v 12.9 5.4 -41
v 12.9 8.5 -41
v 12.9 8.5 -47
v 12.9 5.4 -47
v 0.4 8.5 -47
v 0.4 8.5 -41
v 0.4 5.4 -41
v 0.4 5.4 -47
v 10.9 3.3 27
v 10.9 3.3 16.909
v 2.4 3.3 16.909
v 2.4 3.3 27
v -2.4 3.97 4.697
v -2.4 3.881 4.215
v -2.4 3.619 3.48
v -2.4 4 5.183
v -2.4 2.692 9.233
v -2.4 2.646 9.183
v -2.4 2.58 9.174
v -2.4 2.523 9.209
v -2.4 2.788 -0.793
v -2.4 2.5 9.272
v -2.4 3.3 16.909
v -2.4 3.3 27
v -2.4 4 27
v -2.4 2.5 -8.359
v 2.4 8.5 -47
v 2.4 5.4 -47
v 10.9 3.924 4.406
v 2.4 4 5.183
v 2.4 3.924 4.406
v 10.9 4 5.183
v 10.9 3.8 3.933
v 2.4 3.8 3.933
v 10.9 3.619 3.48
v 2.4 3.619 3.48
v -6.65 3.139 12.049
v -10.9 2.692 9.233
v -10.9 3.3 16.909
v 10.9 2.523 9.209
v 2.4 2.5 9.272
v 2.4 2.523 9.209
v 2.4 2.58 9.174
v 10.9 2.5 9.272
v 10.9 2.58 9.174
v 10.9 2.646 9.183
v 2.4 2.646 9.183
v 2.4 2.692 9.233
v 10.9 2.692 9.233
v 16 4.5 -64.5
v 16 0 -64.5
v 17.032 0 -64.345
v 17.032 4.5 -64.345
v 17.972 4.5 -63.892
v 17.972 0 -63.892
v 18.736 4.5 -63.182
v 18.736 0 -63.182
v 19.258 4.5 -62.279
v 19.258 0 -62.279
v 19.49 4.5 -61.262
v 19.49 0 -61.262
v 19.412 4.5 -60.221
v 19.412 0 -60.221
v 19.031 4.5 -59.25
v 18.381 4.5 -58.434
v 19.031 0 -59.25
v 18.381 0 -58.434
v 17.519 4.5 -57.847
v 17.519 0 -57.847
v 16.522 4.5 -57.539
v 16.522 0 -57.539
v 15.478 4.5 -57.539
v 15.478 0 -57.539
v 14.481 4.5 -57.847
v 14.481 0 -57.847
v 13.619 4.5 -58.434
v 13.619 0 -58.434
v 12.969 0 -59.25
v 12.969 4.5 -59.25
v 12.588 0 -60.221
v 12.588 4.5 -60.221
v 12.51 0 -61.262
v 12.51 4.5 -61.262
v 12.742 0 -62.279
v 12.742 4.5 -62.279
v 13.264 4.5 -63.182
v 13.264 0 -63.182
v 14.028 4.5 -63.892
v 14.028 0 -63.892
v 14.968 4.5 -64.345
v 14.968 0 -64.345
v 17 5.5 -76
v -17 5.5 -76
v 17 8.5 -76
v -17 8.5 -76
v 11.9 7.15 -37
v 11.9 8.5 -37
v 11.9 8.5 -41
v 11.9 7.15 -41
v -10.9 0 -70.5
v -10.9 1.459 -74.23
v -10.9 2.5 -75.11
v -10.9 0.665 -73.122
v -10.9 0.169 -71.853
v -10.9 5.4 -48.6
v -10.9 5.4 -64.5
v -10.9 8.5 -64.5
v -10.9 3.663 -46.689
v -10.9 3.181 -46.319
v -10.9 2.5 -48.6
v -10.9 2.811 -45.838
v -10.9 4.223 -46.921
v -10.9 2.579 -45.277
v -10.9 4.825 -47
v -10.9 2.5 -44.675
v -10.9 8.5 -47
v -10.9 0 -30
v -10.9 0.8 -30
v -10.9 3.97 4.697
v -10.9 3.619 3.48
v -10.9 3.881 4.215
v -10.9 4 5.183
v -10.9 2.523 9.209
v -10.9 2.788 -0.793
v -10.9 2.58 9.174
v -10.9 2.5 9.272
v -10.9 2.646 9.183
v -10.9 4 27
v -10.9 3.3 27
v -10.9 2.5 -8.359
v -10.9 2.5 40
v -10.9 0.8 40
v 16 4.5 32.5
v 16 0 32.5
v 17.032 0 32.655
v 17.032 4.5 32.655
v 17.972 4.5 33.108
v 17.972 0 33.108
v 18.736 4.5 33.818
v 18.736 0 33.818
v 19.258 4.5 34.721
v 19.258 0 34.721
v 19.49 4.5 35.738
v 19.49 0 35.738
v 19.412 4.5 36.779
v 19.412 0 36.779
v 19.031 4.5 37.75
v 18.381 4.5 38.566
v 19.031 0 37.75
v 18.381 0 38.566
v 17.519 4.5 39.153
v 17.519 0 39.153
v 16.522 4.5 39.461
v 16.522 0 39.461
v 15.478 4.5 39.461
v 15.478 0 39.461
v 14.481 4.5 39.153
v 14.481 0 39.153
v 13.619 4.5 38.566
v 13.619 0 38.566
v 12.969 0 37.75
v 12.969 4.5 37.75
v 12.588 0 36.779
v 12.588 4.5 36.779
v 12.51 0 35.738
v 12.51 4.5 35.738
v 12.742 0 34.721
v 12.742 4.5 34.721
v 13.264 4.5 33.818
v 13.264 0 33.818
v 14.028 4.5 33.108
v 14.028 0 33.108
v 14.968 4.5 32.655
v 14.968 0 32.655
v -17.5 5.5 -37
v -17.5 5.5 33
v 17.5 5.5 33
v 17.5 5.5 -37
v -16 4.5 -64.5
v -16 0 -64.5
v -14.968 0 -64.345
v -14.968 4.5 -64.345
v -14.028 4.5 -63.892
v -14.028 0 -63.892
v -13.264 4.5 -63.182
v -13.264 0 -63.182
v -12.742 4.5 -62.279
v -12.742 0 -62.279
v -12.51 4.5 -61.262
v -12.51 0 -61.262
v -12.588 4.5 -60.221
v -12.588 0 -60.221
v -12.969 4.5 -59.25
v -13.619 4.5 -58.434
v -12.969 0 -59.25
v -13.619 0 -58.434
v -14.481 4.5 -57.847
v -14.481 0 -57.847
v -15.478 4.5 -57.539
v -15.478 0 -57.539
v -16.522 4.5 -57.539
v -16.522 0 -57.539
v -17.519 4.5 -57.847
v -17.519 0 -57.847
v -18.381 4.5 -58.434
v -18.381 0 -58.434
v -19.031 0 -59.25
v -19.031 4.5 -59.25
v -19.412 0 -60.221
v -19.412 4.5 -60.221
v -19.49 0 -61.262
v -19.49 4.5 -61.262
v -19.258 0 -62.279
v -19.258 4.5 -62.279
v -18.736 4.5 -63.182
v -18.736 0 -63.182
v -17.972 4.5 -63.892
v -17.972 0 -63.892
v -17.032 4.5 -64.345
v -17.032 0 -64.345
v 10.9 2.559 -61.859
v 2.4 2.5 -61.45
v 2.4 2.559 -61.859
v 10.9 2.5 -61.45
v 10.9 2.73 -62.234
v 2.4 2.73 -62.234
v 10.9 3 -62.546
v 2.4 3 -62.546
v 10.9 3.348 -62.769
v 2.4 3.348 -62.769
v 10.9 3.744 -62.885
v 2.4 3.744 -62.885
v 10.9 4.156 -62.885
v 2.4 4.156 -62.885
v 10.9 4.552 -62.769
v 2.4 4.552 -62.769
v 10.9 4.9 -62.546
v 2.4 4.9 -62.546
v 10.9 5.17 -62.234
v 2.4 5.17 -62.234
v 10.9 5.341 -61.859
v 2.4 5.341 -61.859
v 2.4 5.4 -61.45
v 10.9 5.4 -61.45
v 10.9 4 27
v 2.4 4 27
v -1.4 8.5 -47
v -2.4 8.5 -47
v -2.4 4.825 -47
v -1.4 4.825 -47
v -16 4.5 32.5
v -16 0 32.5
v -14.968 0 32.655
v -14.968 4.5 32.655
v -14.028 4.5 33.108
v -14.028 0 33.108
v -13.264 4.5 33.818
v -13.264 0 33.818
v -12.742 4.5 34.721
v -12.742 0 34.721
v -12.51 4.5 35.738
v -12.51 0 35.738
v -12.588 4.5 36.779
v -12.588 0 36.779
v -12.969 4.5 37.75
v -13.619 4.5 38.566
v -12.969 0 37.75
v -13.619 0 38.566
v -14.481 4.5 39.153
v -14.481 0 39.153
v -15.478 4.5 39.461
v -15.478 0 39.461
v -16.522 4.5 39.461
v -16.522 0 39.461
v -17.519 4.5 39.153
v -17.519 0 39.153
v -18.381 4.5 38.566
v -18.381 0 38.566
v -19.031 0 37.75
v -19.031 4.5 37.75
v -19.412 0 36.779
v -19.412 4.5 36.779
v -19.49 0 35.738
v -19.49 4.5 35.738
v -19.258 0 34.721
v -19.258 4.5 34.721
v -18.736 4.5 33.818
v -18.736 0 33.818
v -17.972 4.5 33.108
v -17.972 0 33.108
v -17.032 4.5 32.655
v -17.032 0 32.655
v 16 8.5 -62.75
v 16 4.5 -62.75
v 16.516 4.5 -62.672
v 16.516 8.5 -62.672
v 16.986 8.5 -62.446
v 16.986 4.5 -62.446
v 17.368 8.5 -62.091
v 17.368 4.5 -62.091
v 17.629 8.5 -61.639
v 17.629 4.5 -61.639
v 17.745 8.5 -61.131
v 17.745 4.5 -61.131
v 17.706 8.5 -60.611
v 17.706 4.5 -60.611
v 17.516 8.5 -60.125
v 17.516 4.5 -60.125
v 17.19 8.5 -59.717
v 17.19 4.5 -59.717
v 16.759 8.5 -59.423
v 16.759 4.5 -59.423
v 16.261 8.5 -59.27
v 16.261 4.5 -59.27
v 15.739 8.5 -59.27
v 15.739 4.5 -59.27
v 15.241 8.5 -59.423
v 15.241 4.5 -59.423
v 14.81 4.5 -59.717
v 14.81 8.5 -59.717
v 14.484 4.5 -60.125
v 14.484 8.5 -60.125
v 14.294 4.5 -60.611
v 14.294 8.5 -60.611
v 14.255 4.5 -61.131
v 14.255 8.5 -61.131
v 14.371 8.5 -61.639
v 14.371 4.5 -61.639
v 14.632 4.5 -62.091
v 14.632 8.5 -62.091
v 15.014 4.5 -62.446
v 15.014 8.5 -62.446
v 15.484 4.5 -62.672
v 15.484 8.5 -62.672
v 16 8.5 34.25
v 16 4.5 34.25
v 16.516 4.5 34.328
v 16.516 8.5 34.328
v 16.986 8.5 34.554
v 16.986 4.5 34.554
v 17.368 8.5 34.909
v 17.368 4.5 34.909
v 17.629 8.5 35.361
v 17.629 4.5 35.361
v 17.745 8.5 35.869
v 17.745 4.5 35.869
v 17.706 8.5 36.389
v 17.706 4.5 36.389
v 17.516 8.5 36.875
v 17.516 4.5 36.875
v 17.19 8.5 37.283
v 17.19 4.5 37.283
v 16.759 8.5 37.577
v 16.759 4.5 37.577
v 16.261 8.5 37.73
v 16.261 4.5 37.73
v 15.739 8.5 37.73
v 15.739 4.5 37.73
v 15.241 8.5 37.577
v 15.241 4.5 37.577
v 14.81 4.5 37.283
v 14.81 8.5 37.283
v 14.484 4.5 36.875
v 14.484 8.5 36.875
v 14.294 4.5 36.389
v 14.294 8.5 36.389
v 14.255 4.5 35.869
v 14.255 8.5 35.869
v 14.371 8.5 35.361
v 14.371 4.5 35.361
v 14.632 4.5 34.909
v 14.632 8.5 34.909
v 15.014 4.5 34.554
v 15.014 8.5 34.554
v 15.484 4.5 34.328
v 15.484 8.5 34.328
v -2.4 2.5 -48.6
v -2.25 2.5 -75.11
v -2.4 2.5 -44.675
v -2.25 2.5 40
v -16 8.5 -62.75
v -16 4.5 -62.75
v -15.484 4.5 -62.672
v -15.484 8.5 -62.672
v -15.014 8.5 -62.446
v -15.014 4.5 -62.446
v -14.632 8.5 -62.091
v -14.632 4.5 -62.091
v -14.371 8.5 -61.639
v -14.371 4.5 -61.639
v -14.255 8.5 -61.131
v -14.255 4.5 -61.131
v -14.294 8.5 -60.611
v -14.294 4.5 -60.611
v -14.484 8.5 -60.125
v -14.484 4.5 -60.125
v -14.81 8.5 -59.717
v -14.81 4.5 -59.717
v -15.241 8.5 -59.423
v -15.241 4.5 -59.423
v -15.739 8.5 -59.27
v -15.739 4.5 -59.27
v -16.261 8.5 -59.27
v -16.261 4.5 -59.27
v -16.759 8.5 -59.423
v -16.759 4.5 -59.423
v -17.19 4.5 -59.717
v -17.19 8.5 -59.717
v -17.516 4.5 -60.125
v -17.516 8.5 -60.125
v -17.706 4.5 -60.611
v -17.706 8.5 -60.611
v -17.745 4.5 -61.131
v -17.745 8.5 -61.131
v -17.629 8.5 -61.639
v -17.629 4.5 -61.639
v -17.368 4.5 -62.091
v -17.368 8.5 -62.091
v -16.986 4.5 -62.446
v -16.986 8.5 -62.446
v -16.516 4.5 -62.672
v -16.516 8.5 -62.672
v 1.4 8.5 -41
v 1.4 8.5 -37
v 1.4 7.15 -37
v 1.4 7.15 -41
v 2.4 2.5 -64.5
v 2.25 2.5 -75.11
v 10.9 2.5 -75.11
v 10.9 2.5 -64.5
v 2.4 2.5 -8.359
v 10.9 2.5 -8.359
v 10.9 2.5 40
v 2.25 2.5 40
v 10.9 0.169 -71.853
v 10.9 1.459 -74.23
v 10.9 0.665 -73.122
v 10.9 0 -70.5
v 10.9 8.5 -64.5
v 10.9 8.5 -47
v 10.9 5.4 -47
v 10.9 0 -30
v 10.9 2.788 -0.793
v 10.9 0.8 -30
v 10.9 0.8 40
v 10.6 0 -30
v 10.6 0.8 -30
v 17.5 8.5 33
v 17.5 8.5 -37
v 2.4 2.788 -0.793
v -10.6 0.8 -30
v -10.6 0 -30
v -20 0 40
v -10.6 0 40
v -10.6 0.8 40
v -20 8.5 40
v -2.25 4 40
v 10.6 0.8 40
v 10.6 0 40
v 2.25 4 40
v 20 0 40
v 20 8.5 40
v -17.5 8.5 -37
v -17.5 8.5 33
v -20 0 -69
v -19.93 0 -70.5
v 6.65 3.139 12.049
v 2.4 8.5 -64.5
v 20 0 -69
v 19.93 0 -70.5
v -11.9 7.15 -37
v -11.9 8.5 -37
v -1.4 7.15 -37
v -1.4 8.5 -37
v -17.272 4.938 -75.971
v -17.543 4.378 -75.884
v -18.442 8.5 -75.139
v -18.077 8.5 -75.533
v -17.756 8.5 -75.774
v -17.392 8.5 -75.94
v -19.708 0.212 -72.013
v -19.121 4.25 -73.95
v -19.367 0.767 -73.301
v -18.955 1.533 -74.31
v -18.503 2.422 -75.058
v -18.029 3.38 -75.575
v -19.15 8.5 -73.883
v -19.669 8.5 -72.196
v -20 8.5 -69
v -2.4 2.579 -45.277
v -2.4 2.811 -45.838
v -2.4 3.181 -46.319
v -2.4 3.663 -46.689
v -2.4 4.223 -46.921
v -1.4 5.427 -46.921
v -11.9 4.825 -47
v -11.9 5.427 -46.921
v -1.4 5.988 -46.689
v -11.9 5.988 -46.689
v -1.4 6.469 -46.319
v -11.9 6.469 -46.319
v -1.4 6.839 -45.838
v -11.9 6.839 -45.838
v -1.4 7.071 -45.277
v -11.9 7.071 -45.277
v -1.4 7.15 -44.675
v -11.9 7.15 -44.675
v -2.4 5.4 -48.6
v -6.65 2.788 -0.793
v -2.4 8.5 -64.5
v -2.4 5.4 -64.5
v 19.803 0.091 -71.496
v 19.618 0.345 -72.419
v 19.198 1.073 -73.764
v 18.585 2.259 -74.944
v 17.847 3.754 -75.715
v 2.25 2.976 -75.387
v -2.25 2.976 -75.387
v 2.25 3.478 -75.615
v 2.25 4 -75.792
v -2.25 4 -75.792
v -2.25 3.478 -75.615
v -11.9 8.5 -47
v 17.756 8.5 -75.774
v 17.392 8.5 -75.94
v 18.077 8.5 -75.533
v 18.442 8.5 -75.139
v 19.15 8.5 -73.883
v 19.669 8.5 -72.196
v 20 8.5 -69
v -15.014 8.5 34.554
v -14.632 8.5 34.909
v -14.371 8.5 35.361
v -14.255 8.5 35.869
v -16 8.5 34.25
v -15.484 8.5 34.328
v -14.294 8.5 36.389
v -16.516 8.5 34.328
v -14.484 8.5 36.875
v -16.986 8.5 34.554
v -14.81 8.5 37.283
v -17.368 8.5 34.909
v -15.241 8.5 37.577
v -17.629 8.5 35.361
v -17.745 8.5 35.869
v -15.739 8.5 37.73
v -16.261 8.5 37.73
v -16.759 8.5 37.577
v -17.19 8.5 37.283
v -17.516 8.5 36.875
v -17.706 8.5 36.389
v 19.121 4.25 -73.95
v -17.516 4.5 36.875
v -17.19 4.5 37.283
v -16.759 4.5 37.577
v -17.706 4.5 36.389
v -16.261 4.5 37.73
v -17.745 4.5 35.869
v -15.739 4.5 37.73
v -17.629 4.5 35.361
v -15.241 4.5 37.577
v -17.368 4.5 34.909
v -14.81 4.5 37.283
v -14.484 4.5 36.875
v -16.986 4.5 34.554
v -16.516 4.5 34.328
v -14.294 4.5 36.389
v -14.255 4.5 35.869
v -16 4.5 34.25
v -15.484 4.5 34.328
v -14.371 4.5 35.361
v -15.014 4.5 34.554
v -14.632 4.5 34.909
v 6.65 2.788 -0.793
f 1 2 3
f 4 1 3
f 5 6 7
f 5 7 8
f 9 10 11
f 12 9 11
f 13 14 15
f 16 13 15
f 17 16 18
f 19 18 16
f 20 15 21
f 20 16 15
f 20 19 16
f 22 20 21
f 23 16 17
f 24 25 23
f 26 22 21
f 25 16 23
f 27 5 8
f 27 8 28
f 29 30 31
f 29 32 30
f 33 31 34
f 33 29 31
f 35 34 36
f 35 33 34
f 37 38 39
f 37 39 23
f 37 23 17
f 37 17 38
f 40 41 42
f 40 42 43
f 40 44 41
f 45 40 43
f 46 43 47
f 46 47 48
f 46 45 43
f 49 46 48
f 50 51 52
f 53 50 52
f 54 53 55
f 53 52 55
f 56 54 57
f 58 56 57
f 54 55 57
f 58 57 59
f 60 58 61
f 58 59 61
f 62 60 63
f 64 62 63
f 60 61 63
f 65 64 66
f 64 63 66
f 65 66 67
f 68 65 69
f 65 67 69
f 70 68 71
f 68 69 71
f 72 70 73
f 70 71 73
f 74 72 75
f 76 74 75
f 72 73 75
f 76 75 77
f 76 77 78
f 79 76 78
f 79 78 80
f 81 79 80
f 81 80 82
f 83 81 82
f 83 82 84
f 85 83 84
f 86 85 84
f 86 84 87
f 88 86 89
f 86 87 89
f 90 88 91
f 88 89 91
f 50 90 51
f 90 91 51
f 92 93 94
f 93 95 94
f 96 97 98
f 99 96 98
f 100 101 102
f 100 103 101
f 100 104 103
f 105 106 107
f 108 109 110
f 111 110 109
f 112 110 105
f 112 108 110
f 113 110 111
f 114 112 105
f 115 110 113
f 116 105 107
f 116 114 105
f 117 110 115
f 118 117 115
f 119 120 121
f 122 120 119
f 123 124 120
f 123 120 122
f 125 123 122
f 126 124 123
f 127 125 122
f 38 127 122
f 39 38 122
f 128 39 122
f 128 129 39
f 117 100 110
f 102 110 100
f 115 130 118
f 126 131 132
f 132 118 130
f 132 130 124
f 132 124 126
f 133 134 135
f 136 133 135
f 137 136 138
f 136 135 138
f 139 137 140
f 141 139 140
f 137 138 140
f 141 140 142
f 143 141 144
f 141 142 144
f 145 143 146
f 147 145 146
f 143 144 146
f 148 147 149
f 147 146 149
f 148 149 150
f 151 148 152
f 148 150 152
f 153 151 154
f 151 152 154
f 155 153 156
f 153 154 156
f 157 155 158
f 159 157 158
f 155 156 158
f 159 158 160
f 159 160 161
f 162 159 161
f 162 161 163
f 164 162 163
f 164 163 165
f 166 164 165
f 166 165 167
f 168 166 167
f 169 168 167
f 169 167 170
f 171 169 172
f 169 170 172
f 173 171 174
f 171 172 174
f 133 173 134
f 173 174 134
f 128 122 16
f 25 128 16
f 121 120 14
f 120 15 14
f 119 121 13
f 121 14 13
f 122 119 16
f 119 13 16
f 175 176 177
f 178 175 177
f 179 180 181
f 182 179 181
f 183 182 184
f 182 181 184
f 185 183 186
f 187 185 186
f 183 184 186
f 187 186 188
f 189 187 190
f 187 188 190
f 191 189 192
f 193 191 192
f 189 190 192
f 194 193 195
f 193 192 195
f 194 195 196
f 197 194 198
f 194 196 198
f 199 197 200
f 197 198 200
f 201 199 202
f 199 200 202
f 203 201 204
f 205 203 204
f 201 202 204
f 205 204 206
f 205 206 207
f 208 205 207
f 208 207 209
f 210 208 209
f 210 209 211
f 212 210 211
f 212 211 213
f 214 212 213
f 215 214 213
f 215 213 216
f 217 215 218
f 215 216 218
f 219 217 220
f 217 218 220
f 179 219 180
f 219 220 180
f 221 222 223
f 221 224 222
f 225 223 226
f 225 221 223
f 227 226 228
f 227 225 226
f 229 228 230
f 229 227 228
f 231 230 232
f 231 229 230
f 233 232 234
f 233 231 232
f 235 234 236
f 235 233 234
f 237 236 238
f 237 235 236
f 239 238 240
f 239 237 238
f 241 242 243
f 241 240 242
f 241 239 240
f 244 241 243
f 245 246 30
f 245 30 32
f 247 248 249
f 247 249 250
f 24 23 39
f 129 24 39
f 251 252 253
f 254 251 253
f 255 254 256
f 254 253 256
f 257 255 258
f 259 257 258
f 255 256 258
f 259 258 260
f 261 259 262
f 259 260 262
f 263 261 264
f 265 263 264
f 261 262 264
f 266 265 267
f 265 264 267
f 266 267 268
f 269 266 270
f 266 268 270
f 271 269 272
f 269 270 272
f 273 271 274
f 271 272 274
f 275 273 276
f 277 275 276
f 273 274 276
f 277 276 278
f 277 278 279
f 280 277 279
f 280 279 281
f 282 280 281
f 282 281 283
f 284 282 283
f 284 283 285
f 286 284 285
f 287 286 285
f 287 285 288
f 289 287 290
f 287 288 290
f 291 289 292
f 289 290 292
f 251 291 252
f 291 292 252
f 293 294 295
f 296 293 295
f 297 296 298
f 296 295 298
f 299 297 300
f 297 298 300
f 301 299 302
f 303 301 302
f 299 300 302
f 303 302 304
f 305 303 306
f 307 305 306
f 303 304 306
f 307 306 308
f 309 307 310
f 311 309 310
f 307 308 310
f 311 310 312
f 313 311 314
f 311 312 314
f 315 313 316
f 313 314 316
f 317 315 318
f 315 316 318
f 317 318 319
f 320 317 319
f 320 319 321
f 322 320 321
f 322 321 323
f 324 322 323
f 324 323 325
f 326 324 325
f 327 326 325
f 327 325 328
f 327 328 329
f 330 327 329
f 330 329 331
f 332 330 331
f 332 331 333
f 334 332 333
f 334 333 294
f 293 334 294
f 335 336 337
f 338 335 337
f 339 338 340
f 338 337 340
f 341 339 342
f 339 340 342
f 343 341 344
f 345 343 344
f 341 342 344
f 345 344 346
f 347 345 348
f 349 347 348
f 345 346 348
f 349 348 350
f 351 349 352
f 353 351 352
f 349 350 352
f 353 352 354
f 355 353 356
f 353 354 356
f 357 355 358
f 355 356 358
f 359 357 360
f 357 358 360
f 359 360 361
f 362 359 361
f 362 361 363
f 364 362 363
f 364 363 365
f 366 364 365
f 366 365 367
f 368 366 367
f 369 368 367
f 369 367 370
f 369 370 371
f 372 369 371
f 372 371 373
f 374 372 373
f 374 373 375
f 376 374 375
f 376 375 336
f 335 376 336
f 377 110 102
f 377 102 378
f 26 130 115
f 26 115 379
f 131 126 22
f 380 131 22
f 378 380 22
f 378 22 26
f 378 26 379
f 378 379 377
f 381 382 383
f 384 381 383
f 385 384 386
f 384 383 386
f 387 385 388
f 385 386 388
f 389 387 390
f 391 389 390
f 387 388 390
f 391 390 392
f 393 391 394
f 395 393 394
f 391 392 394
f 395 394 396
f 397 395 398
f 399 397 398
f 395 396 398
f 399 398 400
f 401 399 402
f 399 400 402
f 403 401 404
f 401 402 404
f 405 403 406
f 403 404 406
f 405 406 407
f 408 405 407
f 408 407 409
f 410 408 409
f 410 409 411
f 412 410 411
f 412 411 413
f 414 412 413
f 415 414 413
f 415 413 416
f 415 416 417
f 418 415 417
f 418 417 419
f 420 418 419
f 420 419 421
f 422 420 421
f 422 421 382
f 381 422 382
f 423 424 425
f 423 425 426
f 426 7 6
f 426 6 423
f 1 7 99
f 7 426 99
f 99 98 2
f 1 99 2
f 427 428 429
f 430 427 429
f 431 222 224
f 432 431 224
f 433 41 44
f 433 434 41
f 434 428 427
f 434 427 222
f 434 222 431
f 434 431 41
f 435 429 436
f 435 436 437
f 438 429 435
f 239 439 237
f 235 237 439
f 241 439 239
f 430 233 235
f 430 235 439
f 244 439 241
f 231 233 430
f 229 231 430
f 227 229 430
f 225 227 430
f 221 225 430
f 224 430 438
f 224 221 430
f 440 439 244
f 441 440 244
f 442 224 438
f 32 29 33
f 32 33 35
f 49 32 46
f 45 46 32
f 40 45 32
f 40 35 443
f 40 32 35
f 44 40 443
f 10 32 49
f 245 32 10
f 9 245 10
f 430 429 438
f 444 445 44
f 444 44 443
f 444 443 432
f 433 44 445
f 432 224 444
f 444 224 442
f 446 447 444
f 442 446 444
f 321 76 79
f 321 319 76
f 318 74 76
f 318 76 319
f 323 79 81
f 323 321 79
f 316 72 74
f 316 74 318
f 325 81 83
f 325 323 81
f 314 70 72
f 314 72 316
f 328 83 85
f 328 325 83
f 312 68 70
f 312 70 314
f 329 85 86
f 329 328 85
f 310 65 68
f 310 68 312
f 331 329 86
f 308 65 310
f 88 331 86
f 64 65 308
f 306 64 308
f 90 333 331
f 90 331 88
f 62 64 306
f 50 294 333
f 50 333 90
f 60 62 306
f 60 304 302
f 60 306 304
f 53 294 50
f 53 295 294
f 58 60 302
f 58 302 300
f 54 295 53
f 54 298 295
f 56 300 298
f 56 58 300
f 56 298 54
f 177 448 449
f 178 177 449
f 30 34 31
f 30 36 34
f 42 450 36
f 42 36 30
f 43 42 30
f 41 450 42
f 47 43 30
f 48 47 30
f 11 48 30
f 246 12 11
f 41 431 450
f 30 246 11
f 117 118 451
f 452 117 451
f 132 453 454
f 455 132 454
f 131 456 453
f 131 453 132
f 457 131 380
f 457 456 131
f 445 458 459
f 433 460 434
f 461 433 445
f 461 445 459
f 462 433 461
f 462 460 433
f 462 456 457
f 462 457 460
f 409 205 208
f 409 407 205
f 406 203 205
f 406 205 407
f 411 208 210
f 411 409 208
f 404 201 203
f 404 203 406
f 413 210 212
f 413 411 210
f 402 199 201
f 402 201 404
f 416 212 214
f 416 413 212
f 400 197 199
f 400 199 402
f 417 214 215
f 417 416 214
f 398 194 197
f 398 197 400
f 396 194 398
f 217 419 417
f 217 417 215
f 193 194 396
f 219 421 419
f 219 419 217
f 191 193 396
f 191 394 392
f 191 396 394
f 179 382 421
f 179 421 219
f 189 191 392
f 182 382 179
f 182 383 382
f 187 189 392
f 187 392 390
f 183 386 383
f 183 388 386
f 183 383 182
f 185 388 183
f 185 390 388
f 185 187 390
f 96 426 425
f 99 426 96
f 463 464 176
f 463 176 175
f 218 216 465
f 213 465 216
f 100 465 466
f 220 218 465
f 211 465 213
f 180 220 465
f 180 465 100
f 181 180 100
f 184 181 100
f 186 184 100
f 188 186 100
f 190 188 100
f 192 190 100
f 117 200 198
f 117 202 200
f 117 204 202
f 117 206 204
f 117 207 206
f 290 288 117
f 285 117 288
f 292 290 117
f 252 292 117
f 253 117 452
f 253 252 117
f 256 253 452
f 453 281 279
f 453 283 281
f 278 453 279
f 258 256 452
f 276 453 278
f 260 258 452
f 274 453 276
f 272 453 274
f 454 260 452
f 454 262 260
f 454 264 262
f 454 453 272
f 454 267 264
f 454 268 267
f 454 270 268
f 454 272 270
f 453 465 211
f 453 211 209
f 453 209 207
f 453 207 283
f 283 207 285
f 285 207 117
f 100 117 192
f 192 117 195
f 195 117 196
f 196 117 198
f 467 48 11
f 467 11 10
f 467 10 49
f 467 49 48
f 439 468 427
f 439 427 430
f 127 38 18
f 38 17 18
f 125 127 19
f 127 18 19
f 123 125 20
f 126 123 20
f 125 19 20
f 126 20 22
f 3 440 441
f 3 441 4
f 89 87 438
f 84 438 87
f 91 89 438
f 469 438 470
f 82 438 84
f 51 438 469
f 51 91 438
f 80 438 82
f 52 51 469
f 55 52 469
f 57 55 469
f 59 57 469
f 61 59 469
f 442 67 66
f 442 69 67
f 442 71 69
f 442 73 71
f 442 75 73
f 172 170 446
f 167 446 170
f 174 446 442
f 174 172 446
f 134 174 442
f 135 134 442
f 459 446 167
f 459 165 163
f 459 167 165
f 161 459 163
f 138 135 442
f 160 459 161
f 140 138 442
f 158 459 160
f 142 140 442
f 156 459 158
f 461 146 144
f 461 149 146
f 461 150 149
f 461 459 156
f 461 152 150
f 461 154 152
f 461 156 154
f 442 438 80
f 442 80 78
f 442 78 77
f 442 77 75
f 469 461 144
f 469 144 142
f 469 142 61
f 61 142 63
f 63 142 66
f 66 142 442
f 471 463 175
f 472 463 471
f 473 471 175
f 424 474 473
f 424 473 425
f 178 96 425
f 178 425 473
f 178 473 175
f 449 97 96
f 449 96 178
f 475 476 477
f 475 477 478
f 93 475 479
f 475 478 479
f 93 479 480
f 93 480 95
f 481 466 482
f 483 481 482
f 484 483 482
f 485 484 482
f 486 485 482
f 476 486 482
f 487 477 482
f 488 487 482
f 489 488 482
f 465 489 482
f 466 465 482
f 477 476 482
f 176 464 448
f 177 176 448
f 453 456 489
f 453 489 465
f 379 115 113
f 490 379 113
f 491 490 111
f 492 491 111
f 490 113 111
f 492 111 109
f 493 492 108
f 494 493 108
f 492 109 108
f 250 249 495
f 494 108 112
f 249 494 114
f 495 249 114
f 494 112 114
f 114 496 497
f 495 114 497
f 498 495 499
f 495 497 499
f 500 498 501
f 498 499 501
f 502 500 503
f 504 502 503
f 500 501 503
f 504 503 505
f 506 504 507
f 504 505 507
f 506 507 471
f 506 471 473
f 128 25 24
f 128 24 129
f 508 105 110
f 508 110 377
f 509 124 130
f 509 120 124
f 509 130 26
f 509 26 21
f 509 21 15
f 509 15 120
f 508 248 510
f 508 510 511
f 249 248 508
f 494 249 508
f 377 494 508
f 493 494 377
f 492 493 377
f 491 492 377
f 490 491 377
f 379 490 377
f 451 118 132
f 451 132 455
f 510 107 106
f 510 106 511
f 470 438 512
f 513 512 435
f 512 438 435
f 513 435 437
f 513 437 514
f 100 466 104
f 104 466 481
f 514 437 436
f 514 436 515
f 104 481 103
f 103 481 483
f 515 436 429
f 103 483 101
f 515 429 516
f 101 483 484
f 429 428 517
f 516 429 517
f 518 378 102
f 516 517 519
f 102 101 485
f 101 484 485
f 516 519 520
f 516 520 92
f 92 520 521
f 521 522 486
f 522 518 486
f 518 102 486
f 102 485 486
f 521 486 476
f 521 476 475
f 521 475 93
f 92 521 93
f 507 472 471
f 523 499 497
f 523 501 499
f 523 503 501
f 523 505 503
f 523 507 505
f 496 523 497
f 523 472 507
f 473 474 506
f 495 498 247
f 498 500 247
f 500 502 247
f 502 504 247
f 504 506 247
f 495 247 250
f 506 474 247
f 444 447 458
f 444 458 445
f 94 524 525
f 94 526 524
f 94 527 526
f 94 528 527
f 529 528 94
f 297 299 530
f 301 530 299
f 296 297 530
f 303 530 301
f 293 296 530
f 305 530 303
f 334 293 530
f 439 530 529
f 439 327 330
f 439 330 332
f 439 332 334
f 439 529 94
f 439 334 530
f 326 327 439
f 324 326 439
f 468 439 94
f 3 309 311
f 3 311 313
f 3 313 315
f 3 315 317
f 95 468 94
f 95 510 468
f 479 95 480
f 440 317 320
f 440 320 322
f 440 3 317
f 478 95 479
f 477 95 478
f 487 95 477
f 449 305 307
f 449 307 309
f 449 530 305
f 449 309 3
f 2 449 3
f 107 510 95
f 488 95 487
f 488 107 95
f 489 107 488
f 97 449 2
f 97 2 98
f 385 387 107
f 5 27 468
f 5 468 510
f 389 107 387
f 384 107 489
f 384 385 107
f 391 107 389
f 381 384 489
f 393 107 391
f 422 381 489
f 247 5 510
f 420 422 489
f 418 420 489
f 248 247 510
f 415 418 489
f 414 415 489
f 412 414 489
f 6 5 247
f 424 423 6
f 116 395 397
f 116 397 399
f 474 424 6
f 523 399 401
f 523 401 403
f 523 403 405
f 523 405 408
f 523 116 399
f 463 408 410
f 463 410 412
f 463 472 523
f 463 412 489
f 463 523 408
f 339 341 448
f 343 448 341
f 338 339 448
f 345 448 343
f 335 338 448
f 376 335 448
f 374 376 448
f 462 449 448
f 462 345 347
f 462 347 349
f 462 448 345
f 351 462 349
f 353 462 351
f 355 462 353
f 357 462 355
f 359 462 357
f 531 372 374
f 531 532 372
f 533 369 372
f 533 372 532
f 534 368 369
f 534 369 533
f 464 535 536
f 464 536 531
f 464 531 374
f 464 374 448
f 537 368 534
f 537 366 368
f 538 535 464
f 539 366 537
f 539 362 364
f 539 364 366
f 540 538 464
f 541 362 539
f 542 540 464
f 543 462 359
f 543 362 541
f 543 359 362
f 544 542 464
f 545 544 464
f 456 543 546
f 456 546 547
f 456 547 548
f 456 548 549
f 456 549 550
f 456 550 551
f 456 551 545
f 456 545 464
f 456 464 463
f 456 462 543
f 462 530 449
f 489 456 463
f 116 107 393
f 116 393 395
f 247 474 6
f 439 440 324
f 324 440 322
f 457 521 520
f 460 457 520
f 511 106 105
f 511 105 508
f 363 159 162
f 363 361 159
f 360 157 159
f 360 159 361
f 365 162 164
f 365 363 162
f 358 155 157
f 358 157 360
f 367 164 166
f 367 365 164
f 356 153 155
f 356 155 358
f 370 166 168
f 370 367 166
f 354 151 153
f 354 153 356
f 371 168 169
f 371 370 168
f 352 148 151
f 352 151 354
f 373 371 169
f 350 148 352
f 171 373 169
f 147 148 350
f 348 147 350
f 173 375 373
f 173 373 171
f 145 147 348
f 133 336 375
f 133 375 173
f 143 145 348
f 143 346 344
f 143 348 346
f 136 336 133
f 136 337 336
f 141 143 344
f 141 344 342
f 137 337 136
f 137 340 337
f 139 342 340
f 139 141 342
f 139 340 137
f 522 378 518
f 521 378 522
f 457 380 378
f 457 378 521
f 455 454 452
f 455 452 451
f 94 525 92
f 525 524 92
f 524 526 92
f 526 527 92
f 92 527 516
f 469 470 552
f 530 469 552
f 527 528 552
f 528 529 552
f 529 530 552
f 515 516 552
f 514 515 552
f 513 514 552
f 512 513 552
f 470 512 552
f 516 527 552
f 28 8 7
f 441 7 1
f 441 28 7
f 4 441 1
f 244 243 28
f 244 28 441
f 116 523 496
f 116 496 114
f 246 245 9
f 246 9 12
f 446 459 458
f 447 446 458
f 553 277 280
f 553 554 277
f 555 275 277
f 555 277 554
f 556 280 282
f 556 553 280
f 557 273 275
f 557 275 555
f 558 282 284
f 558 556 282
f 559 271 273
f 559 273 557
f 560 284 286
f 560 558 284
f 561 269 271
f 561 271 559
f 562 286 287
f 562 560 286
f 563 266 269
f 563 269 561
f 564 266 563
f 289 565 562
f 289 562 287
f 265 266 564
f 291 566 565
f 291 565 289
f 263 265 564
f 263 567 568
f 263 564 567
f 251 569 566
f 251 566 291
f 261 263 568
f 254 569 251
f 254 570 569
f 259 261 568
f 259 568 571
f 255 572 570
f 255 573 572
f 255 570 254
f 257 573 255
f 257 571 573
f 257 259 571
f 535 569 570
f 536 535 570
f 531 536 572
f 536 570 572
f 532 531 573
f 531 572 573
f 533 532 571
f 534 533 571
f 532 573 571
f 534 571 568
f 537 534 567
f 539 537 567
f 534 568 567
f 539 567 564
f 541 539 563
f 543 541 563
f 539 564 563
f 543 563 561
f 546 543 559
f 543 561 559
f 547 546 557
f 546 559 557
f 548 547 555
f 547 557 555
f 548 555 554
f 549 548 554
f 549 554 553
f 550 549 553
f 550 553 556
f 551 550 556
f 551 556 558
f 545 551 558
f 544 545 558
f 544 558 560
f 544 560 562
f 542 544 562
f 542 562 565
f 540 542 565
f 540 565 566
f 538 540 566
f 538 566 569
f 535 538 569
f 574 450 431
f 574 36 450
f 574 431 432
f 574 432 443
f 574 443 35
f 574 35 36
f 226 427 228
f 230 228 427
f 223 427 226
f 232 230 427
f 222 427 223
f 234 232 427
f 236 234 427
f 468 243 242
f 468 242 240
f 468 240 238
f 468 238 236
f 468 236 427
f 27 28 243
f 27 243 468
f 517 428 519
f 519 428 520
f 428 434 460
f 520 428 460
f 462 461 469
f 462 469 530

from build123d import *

# Parameters (mm, degrees)
SKETCH1_W                  = 40
SKETCH1_H                  = 106
BOSS_EXTRUDE1_DEPTH        = 8.5
SKETCH2_W                  = 35
SKETCH2_H                  = 70
CUT_EXTRUDE1_DEPTH         = 3
SKETCH3_W                  = 10.5
SKETCH3_H                  = 10
CUT_EXTRUDE2_DEPTH         = 1.35
SKETCH4_W                  = 12.5
SKETCH4_H                  = 6
CUT_EXTRUDE3_DEPTH         = 3.1
SKETCH5_W                  = 8.5
SKETCH5_H                  = 17.5
PCB_PLACE_DEPTH            = 3.1
SKETCH6_W                  = 8.5
SKETCH6_H                  = 1.6
NICKEL_STRIP_HOLE_DEPTH    = 70.174850921
CUT_EXTRUDE4_REACH         = 71.486
SKETCH7_W                  = 8.5
SKETCH7_H                  = 17.5
SKETCH8_W                  = 8.5
SKETCH8_H                  = 1.6
CUT_EXTRUDE5_DEPTH         = 10
SKETCH9_W                  = 8.5
SKETCH9_H                  = 106
NICKEL_STRIP_RAIL_DEPTH    = 2.5
FILLET3_R                  = 2.325
FILLET4_RADIUS             = 1.45
FILLET4_LENGTH             = 8.5
SKETCH10_W                 = 8.5
SKETCH10_H                 = 5
CUT_EXTRUDE6_DEPTH         = 1.5
SKETCH11_W                 = 8.5
SKETCH11_H                 = 0.7
NICKELSTRIPINSERTION_DEPTH = 18
FILLET5_INSERTION_START    = -10.9
FILLET5_INSERTION_DEPTH    = 8.5
FILLET5_INSERTION_START_2  = 2.4
FILLET5_INSERTION_2_DEPTH  = 8.5
FILLET7_AMEND_R            = 4
FILLET6_START              = -10.9
FILLET6_DEPTH              = 8.5
FILLET6_START_2            = 2.4
FILLET6_2_DEPTH            = 8.5
FILLET8_ROUNDING_R         = 0.1
SKETCH12_W                 = 0.3
SKETCH12_H                 = 0.8
STRIPRAIL_DEPTH            = 70
SKETCH13_R                 = 1.75
SCREW_HOLES_DEPTH          = 70.485610128
SKETCH14_R                 = 3.5
SCREW_HEAD_HOLES_TBM_DEPTH = 4.5
BOSS_EXTRUDE2_DEPTH        = 10
FILLET12_SIZE              = 7
FILLET12_SIZE_2            = 3
FILLET11_R                 = 5.5
SKETCH17_W                 = 4.5
SKETCH17_H                 = 4
CUT_EXTRUDE9_DEPTH         = 116
SKETCH18_W                 = 5.4
SKETCH18_H                 = 2.5
CUT_EXTRUDE10_DEPTH        = 116


with BuildPart() as part:
    # Sketch1 → Boss-Extrude1 (new body)
    with BuildSketch(Plane(origin=(0, 0, 0), x_dir=(1, 0, 0), z_dir=(0, 1, 0))):
        with Locations((0, 13)):
            Rectangle(SKETCH1_W, SKETCH1_H)
    extrude(amount=BOSS_EXTRUDE1_DEPTH)

    # Sketch2 → Cut-Extrude1 (cut)
    with BuildSketch(Plane(origin=(0, 8.5, 0), x_dir=(1, 0, 0), z_dir=(0, 1, 0))):
        with Locations((0, 2)):
            Rectangle(SKETCH2_W, SKETCH2_H)
    extrude(amount=-CUT_EXTRUDE1_DEPTH, mode=Mode.SUBTRACT)

    # Sketch3 → Cut-Extrude2 (cut)
    with BuildSketch(Plane(origin=(0, 8.5, 0), x_dir=(1, 0, 0), z_dir=(0, 1, 0))):
        with Locations((-6.65, 42)):
            Rectangle(SKETCH3_W, SKETCH3_H)
        with Locations((6.65, 42)):
            Rectangle(SKETCH3_W, SKETCH3_H)
    extrude(amount=-CUT_EXTRUDE2_DEPTH, mode=Mode.SUBTRACT)

    # Sketch4 → Cut-Extrude3 (cut)
    with BuildSketch(Plane(origin=(0, 8.5, 0), x_dir=(1, 0, 0), z_dir=(0, 1, 0))):
        with Locations((6.65, 44)):
            Rectangle(SKETCH4_W, SKETCH4_H)
    extrude(amount=-CUT_EXTRUDE3_DEPTH, mode=Mode.SUBTRACT)

    # Sketch5 → PCB place (cut)
    with BuildSketch(Plane(origin=(0, 8.5, 0), x_dir=(1, 0, 0), z_dir=(0, 1, 0))):
        with Locations((6.65, 55.75)):
            Rectangle(SKETCH5_W, SKETCH5_H)
    extrude(amount=-PCB_PLACE_DEPTH, mode=Mode.SUBTRACT)

    # Sketch6 → Nickel strip hole (cut, through all)
    with BuildSketch(Plane(origin=(0, 5.4, 0), x_dir=(1, 0, 0), z_dir=(0, 1, 0))):
        with Locations((6.65, 63.7)):
            Rectangle(SKETCH6_W, SKETCH6_H)
    extrude(amount=-NICKEL_STRIP_HOLE_DEPTH, mode=Mode.SUBTRACT)

    # Cut-Extrude4: up to this face of the body (flat: up to its plane)
    cut_extrude4_end = Plane(part.part.faces().sort_by_distance((6.65, 5.4, -51.042077088))[0])
    # Sketch7 → Cut-Extrude4 (cut, up to the picked face)
    with BuildSketch(Plane(origin=(0, 8.5, 0), x_dir=(1, 0, 0), z_dir=(0, 1, 0)), mode=Mode.PRIVATE) as cut_extrude4_sk1:
        with Locations((-6.65, 55.75)):
            Rectangle(SKETCH7_W, SKETCH7_H)
    cut_extrude4_tool1 = split(extrude(cut_extrude4_sk1.sketch, amount=-CUT_EXTRUDE4_REACH, mode=Mode.PRIVATE), bisect_by=cut_extrude4_end, keep=Keep.BOTH, mode=Mode.PRIVATE)
    add(cut_extrude4_tool1.solids().sort_by(Axis((-6.65, 8.5, -55.75), (0, -1, 0)))[0], mode=Mode.SUBTRACT)

    # Sketch8 → Cut-Extrude5 (cut)
    with BuildSketch(Plane(origin=(0, 5.4, 0), x_dir=(1, 0, 0), z_dir=(0, 1, 0))):
        with Locations((-6.65, 47.8)):
            Rectangle(SKETCH8_W, SKETCH8_H)
    extrude(amount=-CUT_EXTRUDE5_DEPTH, mode=Mode.SUBTRACT)

    # Sketch9 → Nickel strip rail (cut)
    with BuildSketch(Plane.XZ):
        with Locations((-6.65, -13)):
            Rectangle(SKETCH9_W, SKETCH9_H)
        with Locations((6.65, -13)):
            Rectangle(SKETCH9_W, SKETCH9_H)
    extrude(amount=-NICKEL_STRIP_RAIL_DEPTH, mode=Mode.SUBTRACT)

    # Fillet3
    # the kernel refuses this fillet: 2.325 mm, written as the material it takes off along each edge
    with BuildSketch(Plane(origin=(3.4125, 7.15, -47), x_dir=(0, 0, 1), z_dir=(-1, 0, 0))) as fillet3_piece_1_section:
        with BuildLine():
            CenterArc((FILLET3_R, -FILLET3_R), FILLET3_R, 90, 90)
            Line((0, -FILLET3_R), (0, 0))
            Line((0, 0), (FILLET3_R, 0))
        make_face()
    fillet3_piece_1 = extrude(amount=20.125, mode=Mode.PRIVATE)
    fillet3_piece_1 = split(fillet3_piece_1, bisect_by=Plane(origin=(-11.9, 7.15, -47), z_dir=(1, 0, 0)), keep=Keep.TOP, mode=Mode.PRIVATE)
    fillet3_piece_1 = split(fillet3_piece_1, bisect_by=Plane(origin=(-1.4, 7.15, -47), z_dir=(-1, 0, 0)), keep=Keep.TOP, mode=Mode.PRIVATE)
    add(fillet3_piece_1, mode=Mode.SUBTRACT)
    with BuildSketch(Plane(origin=(-10.9, 2.5, -47), x_dir=(0, 1, 0), z_dir=(1, 0, 0))) as fillet3_piece_2:
        with BuildLine():
            CenterArc((FILLET3_R, FILLET3_R), FILLET3_R, 180, 90)
            Line((0, FILLET3_R), (0, 0))
            Line((0, 0), (FILLET3_R, 0))
        make_face()
    extrude(amount=8.5, mode=Mode.SUBTRACT)

    # Fillet4: full round fillet: the end face becomes a half cylinder, R = half its width
    fillet4_face = Plane((6.65, 3.95, -62.9), x_dir=(1, 0, 0), z_dir=(0, 0, -1))  # on the end face: x along it, z out of the body
    fillet4_slab = fillet4_face.offset(-FILLET4_RADIUS / 2) * Box(FILLET4_LENGTH, 2 * FILLET4_RADIUS, FILLET4_RADIUS, mode=Mode.PRIVATE)  # the body's end, R deep
    fillet4_round = Plane((6.65, 3.95, -61.45), x_dir=(0, 0, -1), z_dir=(1, 0, 0)) * Cylinder(FILLET4_RADIUS, FILLET4_LENGTH, mode=Mode.PRIVATE)  # its axis R under the face
    add(fillet4_slab - fillet4_round, mode=Mode.SUBTRACT)

    # Sketch10 → Cut-Extrude6 (cut)
    with BuildSketch(Plane.XZ.offset(-2.5)):
        with Locations((6.65, 6.5)):
            Rectangle(SKETCH10_W, SKETCH10_H)
        with Locations((-6.65, 6.5)):
            Rectangle(SKETCH10_W, SKETCH10_H)
    extrude(amount=-CUT_EXTRUDE6_DEPTH, mode=Mode.SUBTRACT)

    # Sketch11 → NickelStripInsertion (cut)
    with BuildSketch(Plane(origin=(0, 0, 9), x_dir=(-1, 0, 0), z_dir=(0, 0, -1))):
        with Locations((-6.65, 3.65)):
            Rectangle(SKETCH11_W, SKETCH11_H)
        with Locations((6.65, 3.65)):
            Rectangle(SKETCH11_W, SKETCH11_H)
    extrude(amount=-NICKELSTRIPINSERTION_DEPTH, mode=Mode.SUBTRACT)

    # Fillet5_insertion: read off the stored shape, not the designer's step
    # Fillet5_insertion outline → Fillet5_insertion (cut)
    with BuildSketch(Plane.YZ.offset(FILLET5_INSERTION_START)):
        with BuildLine():
            Line((2.5, 4), (2.5, -8.359207094))
            add(Edge.make_bspline(
                [(2.5, -8.359207094), (2.5, 2.968380423), (4, 4)],
                knots=[0, 0, 0, 1, 1, 1], degree=2, weights=[1, 0.885061203, 1]))
            Line((4, 4), (2.5, 4))
        make_face()
    extrude(amount=FILLET5_INSERTION_DEPTH, mode=Mode.SUBTRACT)

    # Fillet5_insertion 2 outline → Fillet5_insertion 2 (cut)
    with BuildSketch(Plane.YZ.offset(FILLET5_INSERTION_START_2)):
        with BuildLine():
            Line((2.5, 4), (2.5, -8.359207094))
            add(Edge.make_bspline(
                [(2.5, -8.359207094), (2.5, 2.968380423), (4, 4)],
                knots=[0, 0, 0, 1, 1, 1], degree=2, weights=[1, 0.885061203, 1]))
            Line((4, 4), (2.5, 4))
        make_face()
    extrude(amount=FILLET5_INSERTION_2_DEPTH, mode=Mode.SUBTRACT)

    # Fillet7_amend
    fillet7_amend_edges = [part.edges().sort_by_distance(p)[0] for p in [
        (6.65, 4, 4),
        (-6.65, 4, 4),
    ]]
    fillet(fillet7_amend_edges, radius=FILLET7_AMEND_R)

    # Fillet6: read off the stored shape, not the designer's step
    # Fillet6 outline → Fillet6 (cut)
    with BuildSketch(Plane.YZ.offset(FILLET6_START)):
        with BuildLine():
            Line((3.3, 9), (3.3, 16.909487973))
            add(Edge.make_bspline(
                [(3.3, 16.909487973), (3.3, 9.121373217), (2.5, 9)],
                knots=[0, 0, 0, 1, 1, 1], degree=2, weights=[1, 0.758287544, 1]))
            Line((2.5, 9), (3.3, 9))
        make_face()
    extrude(amount=FILLET6_DEPTH, mode=Mode.SUBTRACT)

    # Fillet6 2 outline → Fillet6 2 (cut)
    with BuildSketch(Plane.YZ.offset(FILLET6_START_2)):
        with BuildLine():
            Line((3.3, 9), (3.3, 16.909487973))
            add(Edge.make_bspline(
                [(3.3, 16.909487973), (3.3, 9.121373217), (2.5, 9)],
                knots=[0, 0, 0, 1, 1, 1], degree=2, weights=[1, 0.758287544, 1]))
            Line((2.5, 9), (3.3, 9))
        make_face()
    extrude(amount=FILLET6_2_DEPTH, mode=Mode.SUBTRACT)

    # Fillet8_rounding
    fillet8_rounding_edges = [part.edges().sort_by_distance(p)[0] for p in [
        (-6.65, 2.5, 9),
        (6.65, 2.5, 9),
    ]]
    fillet(fillet8_rounding_edges, radius=FILLET8_ROUNDING_R)

    # Sketch12 → StripRail (add)
    with BuildSketch(Plane.XY.offset(40)):
        with Locations((2.55, 0.4)):
            Rectangle(SKETCH12_W, SKETCH12_H)
        with Locations((-10.75, 0.4)):
            Rectangle(SKETCH12_W, SKETCH12_H)
        with Locations((-2.55, 0.4)):
            Rectangle(SKETCH12_W, SKETCH12_H)
        with Locations((10.75, 0.4)):
            Rectangle(SKETCH12_W, SKETCH12_H)
    extrude(amount=-STRIPRAIL_DEPTH)

    # Sketch13 → Screw_Holes (cut, through all)
    with BuildSketch(Plane.XZ):
        with Locations(Location((-16, -61, 0), (0, 0, 270))):
            Circle(SKETCH13_R)
        with Locations(Location((16, -61, 0), (0, 0, 270))):
            Circle(SKETCH13_R)
        with Locations(Location((-16, 36, 0), (0, 0, 270))):
            Circle(SKETCH13_R)
        with Locations(Location((16, 36, 0), (0, 0, 270))):
            Circle(SKETCH13_R)
    extrude(amount=-SCREW_HOLES_DEPTH, mode=Mode.SUBTRACT)

    # Sketch14 → Screw_Head_Holes_TBM (cut)
    with BuildSketch(Plane.XZ):
        with Locations(Location((16, -61, 0), (0, 0, 270))):
            Circle(SKETCH14_R)
        with Locations(Location((-16, -61, 0), (0, 0, 270))):
            Circle(SKETCH14_R)
        with Locations(Location((16, 36, 0), (0, 0, 270))):
            Circle(SKETCH14_R)
        with Locations(Location((-16, 36, 0), (0, 0, 270))):
            Circle(SKETCH14_R)
    extrude(amount=-SCREW_HEAD_HOLES_TBM_DEPTH, mode=Mode.SUBTRACT)

    # Sketch15 → Boss-Extrude2 (add)
    with BuildSketch(Plane(origin=(0, 0, -66), x_dir=(-1, 0, 0), z_dir=(0, 0, -1))):
        Polygon((-20, 0), (-20, 8.5), (20, 8.5), (20, 0), (10.9, 0), (10.9, 2.5), (2.4, 2.5), (2.4, 0), (-2.4, 0), (-2.4, 2.5), (-10.9, 2.5), (-10.9, 0), align=None)
    extrude(amount=BOSS_EXTRUDE2_DEPTH)

    # Fillet12
    # a fillet whose section is not a circle: 7, 3 mm, written as the material it takes off along each edge
    with BuildSketch(Plane(origin=(20, -17.5, -76), x_dir=(0, 0, 1), z_dir=(0, 1, 0)), Plane(origin=(-20, 26, -76), x_dir=(0, 0, 1), z_dir=(0, -1, 0))) as fillet12_piece_1:
        with BuildLine():
            Bezier((FILLET12_SIZE, 0), (0, 0), (0, -FILLET12_SIZE_2), weights=[1, 0.707106781, 1])
            Line((0, -FILLET12_SIZE_2), (0, 0))
            Line((0, 0), (FILLET12_SIZE, 0))
        make_face()
    extrude(amount=43.5, mode=Mode.SUBTRACT)

    # Fillet11
    # the kernel refuses this fillet: 5.5 mm, written as the material it takes off along each edge
    with BuildSketch(Plane(origin=(-16.15, 0, -76), x_dir=(0, 1, 0), z_dir=(1, 0, 0))) as fillet11_piece_1:
        with BuildLine():
            CenterArc((FILLET11_R, FILLET11_R), FILLET11_R, 180, 90)
            Line((0, FILLET11_R), (0, 0))
            Line((0, 0), (FILLET11_R, 0))
        make_face()
    extrude(amount=32.3, mode=Mode.SUBTRACT)
    with BuildSketch(Plane(origin=(-30.75, 0, -76), x_dir=(0, 0, 1), z_dir=(1, 0, 0))) as fillet11_piece_2:
        with BuildLine():
            CenterArc((FILLET11_R, -FILLET11_R), FILLET11_R, 90, 90)
            Line((0, -FILLET11_R), (0, 0))
            Line((0, 0), (FILLET11_R, 0))
        make_face()
    extrude(amount=33.6, mode=Mode.SUBTRACT)
    with BuildSketch(Plane(origin=(-2.85, 0, -76), x_dir=(0, 1, 0), z_dir=(1, 0, 0))) as fillet11_piece_3:
        with BuildLine():
            CenterArc((FILLET11_R, FILLET11_R), FILLET11_R, 180, 90)
            Line((0, FILLET11_R), (0, 0))
            Line((0, 0), (FILLET11_R, 0))
        make_face()
    extrude(amount=33.6, mode=Mode.SUBTRACT)

    # Sketch17 → Cut-Extrude9 (cut)
    with BuildSketch(Plane.XY.offset(40)):
        with Locations((0, 2)):
            Rectangle(SKETCH17_W, SKETCH17_H)
    extrude(amount=-CUT_EXTRUDE9_DEPTH, mode=Mode.SUBTRACT)

    # Sketch18 → Cut-Extrude10 (cut)
    with BuildSketch(Plane.XY.offset(40)):
        with Locations((0, 1.25)):
            Rectangle(SKETCH18_W, SKETCH18_H)
    extrude(amount=-CUT_EXTRUDE10_DEPTH, mode=Mode.SUBTRACT)


solid = part.part
